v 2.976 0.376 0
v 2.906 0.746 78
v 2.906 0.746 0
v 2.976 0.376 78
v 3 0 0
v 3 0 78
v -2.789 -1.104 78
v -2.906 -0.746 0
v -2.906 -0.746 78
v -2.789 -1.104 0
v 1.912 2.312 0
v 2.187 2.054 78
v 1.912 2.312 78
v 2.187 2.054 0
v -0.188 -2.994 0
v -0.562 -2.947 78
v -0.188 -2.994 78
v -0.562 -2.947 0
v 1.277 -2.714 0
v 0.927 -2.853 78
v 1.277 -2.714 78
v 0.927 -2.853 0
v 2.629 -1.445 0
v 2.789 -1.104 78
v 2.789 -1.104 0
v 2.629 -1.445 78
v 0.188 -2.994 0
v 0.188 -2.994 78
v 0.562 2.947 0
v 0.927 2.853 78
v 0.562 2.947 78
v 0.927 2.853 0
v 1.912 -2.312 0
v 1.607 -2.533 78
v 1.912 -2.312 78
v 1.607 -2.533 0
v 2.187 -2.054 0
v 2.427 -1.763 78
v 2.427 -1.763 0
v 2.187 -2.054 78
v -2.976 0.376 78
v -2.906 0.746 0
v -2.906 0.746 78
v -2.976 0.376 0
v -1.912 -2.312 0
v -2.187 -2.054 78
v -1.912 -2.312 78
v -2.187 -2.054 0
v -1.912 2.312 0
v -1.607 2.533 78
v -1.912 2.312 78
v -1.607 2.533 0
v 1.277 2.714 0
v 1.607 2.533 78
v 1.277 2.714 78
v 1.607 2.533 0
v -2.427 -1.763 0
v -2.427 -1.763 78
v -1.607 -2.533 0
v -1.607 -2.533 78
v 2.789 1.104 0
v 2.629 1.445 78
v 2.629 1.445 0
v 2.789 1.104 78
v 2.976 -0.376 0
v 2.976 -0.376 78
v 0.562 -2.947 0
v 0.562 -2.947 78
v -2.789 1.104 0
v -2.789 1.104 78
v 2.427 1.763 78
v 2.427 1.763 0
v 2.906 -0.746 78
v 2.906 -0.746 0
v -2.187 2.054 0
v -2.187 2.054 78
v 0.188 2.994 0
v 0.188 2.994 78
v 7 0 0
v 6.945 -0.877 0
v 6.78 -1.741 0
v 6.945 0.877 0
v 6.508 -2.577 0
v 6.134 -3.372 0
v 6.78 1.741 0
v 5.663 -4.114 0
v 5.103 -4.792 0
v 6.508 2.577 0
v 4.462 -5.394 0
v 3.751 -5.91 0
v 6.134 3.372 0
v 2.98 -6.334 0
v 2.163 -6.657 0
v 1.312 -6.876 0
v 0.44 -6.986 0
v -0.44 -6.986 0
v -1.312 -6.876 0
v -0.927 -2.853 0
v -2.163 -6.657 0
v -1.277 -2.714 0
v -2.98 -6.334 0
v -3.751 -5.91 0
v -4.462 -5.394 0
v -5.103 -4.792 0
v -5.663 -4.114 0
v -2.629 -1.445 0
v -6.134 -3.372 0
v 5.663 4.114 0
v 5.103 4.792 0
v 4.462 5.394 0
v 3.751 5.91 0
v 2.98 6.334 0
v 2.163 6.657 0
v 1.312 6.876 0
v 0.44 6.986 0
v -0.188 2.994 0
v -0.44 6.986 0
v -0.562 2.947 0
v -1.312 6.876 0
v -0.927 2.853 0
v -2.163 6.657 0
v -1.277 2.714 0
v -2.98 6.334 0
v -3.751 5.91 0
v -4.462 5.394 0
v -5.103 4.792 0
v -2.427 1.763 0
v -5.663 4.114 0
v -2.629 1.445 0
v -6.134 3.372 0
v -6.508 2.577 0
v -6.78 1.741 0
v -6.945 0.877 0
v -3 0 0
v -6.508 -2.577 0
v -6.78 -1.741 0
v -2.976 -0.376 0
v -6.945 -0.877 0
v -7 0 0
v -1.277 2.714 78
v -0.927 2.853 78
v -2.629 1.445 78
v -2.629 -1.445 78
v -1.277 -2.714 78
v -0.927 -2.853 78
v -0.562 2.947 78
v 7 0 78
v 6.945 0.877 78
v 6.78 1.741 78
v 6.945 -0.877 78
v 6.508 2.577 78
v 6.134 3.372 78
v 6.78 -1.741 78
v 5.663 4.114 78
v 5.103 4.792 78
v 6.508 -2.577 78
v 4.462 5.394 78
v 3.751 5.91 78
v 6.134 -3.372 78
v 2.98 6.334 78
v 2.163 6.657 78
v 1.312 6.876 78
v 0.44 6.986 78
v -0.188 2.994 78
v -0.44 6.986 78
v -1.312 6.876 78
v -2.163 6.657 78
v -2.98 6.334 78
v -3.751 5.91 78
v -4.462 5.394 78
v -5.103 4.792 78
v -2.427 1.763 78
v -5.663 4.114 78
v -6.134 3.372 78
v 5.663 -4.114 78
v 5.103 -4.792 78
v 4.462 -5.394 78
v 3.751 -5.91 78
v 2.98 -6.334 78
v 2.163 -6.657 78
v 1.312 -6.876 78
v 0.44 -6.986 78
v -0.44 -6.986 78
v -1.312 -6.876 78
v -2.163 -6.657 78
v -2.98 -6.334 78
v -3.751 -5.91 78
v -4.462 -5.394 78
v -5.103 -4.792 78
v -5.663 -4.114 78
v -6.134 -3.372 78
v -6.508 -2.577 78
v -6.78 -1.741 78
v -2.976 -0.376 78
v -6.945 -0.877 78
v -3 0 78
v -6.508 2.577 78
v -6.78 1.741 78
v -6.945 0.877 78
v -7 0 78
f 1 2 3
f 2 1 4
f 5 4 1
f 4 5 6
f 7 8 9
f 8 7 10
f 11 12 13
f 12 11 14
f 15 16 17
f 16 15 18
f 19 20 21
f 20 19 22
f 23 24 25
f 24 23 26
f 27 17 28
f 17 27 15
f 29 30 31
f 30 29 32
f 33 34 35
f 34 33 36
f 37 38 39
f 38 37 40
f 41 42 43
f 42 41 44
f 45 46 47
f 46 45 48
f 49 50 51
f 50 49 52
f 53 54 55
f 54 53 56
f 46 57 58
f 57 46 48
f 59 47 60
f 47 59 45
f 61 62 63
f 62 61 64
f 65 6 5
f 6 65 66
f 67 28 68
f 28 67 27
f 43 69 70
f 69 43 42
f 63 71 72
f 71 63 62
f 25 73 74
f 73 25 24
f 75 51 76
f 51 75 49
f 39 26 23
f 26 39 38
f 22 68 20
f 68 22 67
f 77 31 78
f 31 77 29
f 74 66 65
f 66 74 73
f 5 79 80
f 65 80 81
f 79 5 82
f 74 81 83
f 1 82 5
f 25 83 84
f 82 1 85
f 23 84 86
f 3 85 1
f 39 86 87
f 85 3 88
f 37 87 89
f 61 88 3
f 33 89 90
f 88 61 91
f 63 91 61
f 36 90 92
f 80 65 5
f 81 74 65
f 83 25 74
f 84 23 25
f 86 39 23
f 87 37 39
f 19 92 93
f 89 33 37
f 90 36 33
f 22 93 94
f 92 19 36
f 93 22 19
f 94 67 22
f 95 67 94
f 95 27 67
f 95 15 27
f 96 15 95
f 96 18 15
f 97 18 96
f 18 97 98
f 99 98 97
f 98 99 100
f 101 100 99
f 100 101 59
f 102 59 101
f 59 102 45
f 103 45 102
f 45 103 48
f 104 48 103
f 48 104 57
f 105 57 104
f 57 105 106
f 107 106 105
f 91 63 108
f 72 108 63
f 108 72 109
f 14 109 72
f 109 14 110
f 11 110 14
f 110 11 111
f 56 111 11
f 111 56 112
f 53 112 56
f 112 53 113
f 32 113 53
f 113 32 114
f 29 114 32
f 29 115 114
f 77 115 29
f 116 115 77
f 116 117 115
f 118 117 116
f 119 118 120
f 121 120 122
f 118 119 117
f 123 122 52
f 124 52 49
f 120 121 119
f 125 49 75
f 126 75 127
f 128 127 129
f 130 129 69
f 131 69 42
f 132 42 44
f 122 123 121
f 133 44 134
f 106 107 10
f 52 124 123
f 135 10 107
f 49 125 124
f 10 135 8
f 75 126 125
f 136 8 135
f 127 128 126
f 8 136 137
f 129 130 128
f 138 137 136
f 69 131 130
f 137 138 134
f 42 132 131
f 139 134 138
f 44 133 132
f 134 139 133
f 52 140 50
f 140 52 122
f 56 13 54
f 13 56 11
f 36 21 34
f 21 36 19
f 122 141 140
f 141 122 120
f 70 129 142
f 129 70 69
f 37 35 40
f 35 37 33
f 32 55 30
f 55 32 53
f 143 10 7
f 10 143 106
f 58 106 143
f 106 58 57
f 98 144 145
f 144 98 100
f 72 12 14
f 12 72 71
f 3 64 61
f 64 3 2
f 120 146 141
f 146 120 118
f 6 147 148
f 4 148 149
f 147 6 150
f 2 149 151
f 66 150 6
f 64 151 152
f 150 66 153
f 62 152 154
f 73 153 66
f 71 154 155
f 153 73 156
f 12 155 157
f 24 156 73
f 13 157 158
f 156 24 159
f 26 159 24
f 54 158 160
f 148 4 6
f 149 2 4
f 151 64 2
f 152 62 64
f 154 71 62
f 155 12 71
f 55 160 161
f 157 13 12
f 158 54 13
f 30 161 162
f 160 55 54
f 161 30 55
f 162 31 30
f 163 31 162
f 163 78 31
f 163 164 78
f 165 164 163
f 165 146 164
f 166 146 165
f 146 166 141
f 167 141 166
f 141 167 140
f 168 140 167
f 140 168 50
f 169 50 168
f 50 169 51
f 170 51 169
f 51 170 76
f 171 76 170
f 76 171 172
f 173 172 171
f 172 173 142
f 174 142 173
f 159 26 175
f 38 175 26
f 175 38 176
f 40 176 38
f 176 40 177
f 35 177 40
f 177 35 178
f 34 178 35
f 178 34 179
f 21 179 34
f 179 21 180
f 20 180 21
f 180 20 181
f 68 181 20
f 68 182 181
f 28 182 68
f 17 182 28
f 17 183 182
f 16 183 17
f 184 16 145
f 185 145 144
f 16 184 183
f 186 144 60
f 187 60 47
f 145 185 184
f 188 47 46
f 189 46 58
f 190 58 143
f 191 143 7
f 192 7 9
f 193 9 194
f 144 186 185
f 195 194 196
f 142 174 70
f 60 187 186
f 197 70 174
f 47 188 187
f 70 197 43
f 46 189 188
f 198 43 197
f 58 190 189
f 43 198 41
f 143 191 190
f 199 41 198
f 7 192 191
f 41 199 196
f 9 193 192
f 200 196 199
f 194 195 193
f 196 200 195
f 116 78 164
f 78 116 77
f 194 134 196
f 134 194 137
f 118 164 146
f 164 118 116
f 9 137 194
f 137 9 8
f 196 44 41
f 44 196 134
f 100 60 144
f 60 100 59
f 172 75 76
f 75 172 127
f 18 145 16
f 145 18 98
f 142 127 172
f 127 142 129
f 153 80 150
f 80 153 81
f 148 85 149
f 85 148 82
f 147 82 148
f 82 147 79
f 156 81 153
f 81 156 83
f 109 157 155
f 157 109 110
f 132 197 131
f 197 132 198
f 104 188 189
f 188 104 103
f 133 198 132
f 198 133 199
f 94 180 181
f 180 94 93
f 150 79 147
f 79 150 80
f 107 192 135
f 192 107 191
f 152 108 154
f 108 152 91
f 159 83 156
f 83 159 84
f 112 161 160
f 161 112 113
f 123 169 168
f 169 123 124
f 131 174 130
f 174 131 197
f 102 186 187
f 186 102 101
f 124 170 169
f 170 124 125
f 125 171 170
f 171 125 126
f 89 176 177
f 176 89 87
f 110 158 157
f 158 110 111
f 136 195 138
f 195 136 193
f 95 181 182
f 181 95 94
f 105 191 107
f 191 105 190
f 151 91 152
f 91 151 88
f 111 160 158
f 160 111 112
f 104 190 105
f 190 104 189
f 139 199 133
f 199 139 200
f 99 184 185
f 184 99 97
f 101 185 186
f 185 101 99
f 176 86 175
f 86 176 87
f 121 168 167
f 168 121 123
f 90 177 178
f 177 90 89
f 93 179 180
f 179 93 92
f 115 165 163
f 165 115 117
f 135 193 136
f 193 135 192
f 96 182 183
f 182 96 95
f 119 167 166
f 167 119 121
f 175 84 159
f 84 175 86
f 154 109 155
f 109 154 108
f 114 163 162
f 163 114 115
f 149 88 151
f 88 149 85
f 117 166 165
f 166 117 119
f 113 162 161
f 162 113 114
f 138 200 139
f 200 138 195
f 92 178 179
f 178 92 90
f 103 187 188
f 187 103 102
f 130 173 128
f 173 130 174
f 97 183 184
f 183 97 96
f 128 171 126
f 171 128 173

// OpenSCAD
$fn = 50;


difference() {
	union() {
		cylinder(h = 78, r = 7.0000000000);
	}
	union() {
		cylinder(h = 78, r = 3.0000000000);
		cylinder(h = 78, r = 1.5000000000);
		cylinder(h = 78, r = 1.5000000000);
		cylinder(h = 78, r = 1.5000000000);
	}
}
